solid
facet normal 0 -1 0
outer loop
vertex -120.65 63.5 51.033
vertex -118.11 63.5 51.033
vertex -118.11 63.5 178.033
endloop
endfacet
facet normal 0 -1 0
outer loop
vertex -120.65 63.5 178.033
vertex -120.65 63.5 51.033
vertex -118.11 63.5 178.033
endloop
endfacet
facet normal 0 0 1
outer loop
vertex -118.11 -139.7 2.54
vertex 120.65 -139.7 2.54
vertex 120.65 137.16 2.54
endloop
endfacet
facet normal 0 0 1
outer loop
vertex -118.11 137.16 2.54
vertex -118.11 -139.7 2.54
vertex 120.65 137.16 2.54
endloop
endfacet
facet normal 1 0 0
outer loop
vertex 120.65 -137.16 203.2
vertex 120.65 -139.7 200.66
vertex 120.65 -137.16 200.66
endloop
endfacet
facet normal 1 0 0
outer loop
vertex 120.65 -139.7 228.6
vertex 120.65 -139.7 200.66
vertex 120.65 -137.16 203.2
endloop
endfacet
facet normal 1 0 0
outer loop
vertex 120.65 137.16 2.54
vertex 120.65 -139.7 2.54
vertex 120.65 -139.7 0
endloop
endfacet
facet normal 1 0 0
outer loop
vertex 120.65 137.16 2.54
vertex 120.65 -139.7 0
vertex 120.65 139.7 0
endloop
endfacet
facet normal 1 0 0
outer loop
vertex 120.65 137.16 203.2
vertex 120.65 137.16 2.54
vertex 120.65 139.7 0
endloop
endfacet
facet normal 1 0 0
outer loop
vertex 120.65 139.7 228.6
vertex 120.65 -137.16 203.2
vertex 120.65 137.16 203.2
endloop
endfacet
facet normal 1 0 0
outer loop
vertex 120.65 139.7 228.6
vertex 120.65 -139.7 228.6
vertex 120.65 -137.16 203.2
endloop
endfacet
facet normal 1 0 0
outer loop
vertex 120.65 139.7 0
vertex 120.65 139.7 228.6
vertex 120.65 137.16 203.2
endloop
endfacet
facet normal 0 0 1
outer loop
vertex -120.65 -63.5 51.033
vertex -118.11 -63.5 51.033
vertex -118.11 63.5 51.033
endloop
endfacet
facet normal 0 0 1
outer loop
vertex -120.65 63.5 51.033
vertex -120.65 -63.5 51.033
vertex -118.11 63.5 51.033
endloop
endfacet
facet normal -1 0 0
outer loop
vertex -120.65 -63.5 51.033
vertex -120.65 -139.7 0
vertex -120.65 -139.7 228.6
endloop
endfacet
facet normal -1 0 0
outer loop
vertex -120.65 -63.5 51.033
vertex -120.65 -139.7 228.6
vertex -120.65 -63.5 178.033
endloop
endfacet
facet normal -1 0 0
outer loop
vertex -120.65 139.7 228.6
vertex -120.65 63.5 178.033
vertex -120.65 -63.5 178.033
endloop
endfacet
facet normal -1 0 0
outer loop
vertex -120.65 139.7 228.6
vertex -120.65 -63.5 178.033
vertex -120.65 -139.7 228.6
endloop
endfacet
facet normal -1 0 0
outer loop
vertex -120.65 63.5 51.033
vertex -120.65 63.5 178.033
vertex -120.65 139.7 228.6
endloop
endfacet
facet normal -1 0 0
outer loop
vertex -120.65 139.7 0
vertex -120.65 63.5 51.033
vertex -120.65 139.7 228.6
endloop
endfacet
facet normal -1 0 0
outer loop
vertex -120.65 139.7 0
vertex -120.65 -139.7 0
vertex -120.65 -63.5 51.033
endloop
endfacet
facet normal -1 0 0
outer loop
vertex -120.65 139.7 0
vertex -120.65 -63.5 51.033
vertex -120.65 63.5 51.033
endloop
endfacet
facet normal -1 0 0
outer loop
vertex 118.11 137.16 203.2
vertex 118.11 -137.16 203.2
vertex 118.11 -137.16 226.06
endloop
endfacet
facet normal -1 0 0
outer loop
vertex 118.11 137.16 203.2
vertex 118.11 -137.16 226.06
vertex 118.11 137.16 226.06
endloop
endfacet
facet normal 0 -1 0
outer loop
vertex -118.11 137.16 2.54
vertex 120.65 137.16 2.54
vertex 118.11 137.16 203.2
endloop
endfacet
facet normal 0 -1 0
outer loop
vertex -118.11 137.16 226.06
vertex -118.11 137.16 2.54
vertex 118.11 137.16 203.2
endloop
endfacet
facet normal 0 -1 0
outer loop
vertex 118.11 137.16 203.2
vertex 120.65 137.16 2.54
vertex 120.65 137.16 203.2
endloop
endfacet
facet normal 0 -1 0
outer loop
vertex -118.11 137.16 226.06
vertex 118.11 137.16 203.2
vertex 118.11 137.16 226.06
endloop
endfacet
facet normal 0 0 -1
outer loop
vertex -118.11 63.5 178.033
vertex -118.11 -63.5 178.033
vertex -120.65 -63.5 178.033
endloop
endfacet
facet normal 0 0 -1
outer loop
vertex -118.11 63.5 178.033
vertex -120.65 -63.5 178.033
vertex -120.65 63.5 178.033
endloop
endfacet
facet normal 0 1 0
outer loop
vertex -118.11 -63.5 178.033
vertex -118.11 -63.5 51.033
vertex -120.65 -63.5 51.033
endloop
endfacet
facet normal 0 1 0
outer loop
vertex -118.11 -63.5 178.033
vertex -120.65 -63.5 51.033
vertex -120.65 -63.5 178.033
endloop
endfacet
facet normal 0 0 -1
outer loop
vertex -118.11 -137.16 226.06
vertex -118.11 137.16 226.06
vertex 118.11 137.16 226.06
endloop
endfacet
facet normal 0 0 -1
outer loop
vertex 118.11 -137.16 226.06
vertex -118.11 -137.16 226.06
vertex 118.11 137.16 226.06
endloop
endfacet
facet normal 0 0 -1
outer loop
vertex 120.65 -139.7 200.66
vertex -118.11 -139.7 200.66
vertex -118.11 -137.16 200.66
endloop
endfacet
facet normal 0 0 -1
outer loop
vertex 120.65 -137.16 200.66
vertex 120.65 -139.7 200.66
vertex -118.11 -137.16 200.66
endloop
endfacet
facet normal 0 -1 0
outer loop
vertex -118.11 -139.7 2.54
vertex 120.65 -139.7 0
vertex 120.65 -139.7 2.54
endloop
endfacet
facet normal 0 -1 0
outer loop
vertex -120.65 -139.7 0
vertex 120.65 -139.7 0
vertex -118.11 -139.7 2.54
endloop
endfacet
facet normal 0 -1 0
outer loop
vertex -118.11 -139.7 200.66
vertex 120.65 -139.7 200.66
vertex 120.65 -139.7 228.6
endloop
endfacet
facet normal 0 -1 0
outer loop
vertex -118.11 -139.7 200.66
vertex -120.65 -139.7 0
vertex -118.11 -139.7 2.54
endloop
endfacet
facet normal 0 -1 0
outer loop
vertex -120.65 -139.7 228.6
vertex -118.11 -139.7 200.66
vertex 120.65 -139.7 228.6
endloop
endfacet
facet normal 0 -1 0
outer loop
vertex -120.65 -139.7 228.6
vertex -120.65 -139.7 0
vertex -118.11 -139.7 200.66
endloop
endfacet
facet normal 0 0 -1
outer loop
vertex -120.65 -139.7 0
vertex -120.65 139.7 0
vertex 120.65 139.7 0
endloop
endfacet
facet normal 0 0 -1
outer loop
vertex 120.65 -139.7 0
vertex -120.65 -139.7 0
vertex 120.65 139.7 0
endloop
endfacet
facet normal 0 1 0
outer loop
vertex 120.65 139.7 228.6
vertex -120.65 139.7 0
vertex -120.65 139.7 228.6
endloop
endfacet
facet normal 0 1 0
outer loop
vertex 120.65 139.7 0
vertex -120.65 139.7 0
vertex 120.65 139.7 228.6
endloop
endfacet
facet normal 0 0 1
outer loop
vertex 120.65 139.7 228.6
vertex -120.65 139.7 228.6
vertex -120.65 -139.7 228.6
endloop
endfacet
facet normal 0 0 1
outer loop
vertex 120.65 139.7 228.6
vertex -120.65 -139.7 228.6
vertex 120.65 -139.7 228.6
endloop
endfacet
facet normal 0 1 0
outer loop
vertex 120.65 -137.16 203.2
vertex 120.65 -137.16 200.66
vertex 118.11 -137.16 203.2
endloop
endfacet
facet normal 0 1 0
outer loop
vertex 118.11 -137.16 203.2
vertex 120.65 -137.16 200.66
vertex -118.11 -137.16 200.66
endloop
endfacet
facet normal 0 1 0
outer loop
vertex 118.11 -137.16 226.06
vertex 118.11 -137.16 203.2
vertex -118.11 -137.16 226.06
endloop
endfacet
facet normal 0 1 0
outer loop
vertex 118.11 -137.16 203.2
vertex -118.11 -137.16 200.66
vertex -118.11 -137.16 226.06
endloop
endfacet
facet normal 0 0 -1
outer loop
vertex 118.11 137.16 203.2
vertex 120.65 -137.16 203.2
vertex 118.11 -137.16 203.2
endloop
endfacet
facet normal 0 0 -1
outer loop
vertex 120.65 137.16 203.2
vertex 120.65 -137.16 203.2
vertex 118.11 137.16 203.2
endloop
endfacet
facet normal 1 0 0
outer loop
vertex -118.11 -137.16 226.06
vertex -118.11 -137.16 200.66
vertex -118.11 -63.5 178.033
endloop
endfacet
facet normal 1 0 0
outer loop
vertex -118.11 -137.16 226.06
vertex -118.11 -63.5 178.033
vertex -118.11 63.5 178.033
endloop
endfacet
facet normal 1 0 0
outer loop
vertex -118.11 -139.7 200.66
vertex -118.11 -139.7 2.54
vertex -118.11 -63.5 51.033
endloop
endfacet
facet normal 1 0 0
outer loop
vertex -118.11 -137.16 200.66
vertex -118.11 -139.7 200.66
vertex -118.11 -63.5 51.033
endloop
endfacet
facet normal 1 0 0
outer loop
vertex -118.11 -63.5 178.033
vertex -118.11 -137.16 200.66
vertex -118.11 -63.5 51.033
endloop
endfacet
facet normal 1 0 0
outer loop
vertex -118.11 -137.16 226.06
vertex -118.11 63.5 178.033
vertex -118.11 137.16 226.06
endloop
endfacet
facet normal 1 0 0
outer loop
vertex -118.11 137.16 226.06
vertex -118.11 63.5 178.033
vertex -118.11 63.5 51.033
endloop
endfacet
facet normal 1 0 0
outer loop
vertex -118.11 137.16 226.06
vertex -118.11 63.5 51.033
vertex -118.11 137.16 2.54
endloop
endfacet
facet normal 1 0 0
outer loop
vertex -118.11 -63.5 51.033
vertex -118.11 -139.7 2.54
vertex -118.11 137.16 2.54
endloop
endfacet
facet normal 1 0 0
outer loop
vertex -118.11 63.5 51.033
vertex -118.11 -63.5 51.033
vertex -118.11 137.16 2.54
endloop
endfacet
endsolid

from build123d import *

# Parameters (mm, degrees)
F0_W     = 241.3
F0_H     = 279.4
F1_DEPTH = 228.6
F2_T     = -2.54
F3_W     = 127
F3_H     = 127
F4_DEPTH = 25.4
F5_W     = 276.86
F5_H     = 200.66
F6_DEPTH = 25.4
F7_W     = 2.54
F7_H     = 25.4
F8_DEPTH = 238.76


with BuildPart() as f1:
    # F0 (on Top) → F1 (new body)
    with BuildSketch(Plane.XY):
        Rectangle(F0_W, F0_H)
    extrude(amount=F1_DEPTH)

    # F2
    f2_openings = [f1.faces().sort_by_distance(p)[0] for p in [
        (0, -139.7, 114.3),
    ]]
    offset(amount=F2_T, openings=f2_openings)

    # F3 (on face) → F4 (cut)
    with BuildSketch(Plane.YZ.offset(-118.11)):
        with Locations((0, 114.533028)):
            Rectangle(F3_W, F3_H)
    extrude(amount=-F4_DEPTH, mode=Mode.SUBTRACT)

    # F5 (on face) → F6 (cut)
    with BuildSketch(Plane.YZ.offset(120.65)):
        with Locations((-1.27, 102.87)):
            Rectangle(F5_W, F5_H)
    extrude(amount=-F6_DEPTH, mode=Mode.SUBTRACT)

    # F7 (on face) → F8 (join, through all)
    with BuildSketch(Plane.YZ.offset(-118.11)):
        with Locations((-138.43, 213.36)):
            Rectangle(F7_W, F7_H)
    extrude(amount=F8_DEPTH)


solid = f1.part
